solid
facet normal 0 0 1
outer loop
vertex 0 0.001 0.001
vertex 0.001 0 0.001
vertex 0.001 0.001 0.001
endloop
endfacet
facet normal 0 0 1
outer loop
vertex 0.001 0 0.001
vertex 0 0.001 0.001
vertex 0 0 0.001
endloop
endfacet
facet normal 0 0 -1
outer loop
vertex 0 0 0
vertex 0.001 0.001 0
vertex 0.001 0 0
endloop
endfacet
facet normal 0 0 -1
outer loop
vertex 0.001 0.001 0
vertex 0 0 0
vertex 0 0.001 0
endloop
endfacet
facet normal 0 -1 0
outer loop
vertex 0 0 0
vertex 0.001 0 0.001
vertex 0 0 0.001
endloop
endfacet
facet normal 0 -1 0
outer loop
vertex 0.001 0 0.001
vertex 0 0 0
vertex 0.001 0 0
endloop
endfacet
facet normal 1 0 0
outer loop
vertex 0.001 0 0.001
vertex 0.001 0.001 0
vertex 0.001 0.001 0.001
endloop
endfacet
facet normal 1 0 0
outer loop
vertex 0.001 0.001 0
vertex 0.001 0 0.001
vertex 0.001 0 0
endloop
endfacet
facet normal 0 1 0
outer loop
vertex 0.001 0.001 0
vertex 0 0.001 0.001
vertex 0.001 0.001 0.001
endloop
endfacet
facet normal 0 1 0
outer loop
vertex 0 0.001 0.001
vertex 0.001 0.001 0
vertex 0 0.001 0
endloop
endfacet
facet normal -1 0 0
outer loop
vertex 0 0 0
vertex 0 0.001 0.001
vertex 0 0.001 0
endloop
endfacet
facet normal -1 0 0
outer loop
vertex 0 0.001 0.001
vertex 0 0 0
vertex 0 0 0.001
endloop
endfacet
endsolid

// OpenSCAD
// file: fixtures/scope_silent.scad
// Fixture for tests/t_scoping.scad. Deliberately sets NOTHING.
function scope_silent_fa() = $fa;
// file: fixtures/scope_sets.scad
// Fixture for tests/t_scoping.scad. Sets $fa/$fs at its own top level.
// Not a test: it lives below tests/ so `just test` and `just check`, which use
// -maxdepth 1, do not try to run it.
$fa = 8;
$fs = 1;
SCOPE_K = 100;

function scope_sets_fa() = $fa;
function scope_sets_k() = SCOPE_K;
// main file
// t_scoping — how `use <>` and $-variables actually interact.
//
// This is here because I got it wrong and filed a bug against a gate that was
// already correct. The reasoning was: $fa is dynamically scoped, and `use <>`
// does not execute a file's top-level assignments, therefore the caller's $fa
// reaches a module called from that file. Both premises are true. The
// conclusion is false, and no test would have told me.
//
// src/ sets no $fa, $fs or $fn anywhere, which is exactly why the library picks
// up the consumer's resolution -- the behaviour asserted below is load-bearing.

// clang-format off
use <fixtures/scope_sets.scad>;
use <fixtures/scope_silent.scad>;
// clang-format on

$fa = 30;
$fs = 5;
SCOPE_K = 999;

// 1. A file's top-level values are NOT exported to the consumer.
assert($fa == 30, "the caller's own $fa is untouched by use<>");
assert(SCOPE_K == 999, "and so is an ordinary variable of the same name");

// 2. But that file's own functions still see them -- they close over the
//    defining file's scope. THIS is the half I had wrong.
assert(scope_sets_fa() == 8, str("a function whose file sets $fa sees 8, not the caller's 30; got ", scope_sets_fa()));
assert(scope_sets_k() == 100, str("ordinary variables behave the same way; got ", scope_sets_k()));

// 3. A name the defining file leaves unset IS dynamically scoped from the call
//    site. This is what lets a consumer set the library's resolution at all.
assert(scope_silent_fa() == 30, str("a function whose file is silent sees the caller's 30; got ", scope_silent_fa()));

// 4. An explicit $-argument at the call site beats both.
assert(scope_silent_fa($fa = 77) == 77, "an explicit $fa at the call site wins");
assert(scope_sets_fa($fa = 77) == 77, "and it wins even over a file that sets its own");

// The consequence for this repository: examples set $fa/$fs at their top level,
// so `part()` renders at the authored resolution however it is invoked -- which
// is why the `just cgal` wrapper was right all along. $fn, which no example
// sets, does come from the wrapper.
cube(0.001); // sentinel
